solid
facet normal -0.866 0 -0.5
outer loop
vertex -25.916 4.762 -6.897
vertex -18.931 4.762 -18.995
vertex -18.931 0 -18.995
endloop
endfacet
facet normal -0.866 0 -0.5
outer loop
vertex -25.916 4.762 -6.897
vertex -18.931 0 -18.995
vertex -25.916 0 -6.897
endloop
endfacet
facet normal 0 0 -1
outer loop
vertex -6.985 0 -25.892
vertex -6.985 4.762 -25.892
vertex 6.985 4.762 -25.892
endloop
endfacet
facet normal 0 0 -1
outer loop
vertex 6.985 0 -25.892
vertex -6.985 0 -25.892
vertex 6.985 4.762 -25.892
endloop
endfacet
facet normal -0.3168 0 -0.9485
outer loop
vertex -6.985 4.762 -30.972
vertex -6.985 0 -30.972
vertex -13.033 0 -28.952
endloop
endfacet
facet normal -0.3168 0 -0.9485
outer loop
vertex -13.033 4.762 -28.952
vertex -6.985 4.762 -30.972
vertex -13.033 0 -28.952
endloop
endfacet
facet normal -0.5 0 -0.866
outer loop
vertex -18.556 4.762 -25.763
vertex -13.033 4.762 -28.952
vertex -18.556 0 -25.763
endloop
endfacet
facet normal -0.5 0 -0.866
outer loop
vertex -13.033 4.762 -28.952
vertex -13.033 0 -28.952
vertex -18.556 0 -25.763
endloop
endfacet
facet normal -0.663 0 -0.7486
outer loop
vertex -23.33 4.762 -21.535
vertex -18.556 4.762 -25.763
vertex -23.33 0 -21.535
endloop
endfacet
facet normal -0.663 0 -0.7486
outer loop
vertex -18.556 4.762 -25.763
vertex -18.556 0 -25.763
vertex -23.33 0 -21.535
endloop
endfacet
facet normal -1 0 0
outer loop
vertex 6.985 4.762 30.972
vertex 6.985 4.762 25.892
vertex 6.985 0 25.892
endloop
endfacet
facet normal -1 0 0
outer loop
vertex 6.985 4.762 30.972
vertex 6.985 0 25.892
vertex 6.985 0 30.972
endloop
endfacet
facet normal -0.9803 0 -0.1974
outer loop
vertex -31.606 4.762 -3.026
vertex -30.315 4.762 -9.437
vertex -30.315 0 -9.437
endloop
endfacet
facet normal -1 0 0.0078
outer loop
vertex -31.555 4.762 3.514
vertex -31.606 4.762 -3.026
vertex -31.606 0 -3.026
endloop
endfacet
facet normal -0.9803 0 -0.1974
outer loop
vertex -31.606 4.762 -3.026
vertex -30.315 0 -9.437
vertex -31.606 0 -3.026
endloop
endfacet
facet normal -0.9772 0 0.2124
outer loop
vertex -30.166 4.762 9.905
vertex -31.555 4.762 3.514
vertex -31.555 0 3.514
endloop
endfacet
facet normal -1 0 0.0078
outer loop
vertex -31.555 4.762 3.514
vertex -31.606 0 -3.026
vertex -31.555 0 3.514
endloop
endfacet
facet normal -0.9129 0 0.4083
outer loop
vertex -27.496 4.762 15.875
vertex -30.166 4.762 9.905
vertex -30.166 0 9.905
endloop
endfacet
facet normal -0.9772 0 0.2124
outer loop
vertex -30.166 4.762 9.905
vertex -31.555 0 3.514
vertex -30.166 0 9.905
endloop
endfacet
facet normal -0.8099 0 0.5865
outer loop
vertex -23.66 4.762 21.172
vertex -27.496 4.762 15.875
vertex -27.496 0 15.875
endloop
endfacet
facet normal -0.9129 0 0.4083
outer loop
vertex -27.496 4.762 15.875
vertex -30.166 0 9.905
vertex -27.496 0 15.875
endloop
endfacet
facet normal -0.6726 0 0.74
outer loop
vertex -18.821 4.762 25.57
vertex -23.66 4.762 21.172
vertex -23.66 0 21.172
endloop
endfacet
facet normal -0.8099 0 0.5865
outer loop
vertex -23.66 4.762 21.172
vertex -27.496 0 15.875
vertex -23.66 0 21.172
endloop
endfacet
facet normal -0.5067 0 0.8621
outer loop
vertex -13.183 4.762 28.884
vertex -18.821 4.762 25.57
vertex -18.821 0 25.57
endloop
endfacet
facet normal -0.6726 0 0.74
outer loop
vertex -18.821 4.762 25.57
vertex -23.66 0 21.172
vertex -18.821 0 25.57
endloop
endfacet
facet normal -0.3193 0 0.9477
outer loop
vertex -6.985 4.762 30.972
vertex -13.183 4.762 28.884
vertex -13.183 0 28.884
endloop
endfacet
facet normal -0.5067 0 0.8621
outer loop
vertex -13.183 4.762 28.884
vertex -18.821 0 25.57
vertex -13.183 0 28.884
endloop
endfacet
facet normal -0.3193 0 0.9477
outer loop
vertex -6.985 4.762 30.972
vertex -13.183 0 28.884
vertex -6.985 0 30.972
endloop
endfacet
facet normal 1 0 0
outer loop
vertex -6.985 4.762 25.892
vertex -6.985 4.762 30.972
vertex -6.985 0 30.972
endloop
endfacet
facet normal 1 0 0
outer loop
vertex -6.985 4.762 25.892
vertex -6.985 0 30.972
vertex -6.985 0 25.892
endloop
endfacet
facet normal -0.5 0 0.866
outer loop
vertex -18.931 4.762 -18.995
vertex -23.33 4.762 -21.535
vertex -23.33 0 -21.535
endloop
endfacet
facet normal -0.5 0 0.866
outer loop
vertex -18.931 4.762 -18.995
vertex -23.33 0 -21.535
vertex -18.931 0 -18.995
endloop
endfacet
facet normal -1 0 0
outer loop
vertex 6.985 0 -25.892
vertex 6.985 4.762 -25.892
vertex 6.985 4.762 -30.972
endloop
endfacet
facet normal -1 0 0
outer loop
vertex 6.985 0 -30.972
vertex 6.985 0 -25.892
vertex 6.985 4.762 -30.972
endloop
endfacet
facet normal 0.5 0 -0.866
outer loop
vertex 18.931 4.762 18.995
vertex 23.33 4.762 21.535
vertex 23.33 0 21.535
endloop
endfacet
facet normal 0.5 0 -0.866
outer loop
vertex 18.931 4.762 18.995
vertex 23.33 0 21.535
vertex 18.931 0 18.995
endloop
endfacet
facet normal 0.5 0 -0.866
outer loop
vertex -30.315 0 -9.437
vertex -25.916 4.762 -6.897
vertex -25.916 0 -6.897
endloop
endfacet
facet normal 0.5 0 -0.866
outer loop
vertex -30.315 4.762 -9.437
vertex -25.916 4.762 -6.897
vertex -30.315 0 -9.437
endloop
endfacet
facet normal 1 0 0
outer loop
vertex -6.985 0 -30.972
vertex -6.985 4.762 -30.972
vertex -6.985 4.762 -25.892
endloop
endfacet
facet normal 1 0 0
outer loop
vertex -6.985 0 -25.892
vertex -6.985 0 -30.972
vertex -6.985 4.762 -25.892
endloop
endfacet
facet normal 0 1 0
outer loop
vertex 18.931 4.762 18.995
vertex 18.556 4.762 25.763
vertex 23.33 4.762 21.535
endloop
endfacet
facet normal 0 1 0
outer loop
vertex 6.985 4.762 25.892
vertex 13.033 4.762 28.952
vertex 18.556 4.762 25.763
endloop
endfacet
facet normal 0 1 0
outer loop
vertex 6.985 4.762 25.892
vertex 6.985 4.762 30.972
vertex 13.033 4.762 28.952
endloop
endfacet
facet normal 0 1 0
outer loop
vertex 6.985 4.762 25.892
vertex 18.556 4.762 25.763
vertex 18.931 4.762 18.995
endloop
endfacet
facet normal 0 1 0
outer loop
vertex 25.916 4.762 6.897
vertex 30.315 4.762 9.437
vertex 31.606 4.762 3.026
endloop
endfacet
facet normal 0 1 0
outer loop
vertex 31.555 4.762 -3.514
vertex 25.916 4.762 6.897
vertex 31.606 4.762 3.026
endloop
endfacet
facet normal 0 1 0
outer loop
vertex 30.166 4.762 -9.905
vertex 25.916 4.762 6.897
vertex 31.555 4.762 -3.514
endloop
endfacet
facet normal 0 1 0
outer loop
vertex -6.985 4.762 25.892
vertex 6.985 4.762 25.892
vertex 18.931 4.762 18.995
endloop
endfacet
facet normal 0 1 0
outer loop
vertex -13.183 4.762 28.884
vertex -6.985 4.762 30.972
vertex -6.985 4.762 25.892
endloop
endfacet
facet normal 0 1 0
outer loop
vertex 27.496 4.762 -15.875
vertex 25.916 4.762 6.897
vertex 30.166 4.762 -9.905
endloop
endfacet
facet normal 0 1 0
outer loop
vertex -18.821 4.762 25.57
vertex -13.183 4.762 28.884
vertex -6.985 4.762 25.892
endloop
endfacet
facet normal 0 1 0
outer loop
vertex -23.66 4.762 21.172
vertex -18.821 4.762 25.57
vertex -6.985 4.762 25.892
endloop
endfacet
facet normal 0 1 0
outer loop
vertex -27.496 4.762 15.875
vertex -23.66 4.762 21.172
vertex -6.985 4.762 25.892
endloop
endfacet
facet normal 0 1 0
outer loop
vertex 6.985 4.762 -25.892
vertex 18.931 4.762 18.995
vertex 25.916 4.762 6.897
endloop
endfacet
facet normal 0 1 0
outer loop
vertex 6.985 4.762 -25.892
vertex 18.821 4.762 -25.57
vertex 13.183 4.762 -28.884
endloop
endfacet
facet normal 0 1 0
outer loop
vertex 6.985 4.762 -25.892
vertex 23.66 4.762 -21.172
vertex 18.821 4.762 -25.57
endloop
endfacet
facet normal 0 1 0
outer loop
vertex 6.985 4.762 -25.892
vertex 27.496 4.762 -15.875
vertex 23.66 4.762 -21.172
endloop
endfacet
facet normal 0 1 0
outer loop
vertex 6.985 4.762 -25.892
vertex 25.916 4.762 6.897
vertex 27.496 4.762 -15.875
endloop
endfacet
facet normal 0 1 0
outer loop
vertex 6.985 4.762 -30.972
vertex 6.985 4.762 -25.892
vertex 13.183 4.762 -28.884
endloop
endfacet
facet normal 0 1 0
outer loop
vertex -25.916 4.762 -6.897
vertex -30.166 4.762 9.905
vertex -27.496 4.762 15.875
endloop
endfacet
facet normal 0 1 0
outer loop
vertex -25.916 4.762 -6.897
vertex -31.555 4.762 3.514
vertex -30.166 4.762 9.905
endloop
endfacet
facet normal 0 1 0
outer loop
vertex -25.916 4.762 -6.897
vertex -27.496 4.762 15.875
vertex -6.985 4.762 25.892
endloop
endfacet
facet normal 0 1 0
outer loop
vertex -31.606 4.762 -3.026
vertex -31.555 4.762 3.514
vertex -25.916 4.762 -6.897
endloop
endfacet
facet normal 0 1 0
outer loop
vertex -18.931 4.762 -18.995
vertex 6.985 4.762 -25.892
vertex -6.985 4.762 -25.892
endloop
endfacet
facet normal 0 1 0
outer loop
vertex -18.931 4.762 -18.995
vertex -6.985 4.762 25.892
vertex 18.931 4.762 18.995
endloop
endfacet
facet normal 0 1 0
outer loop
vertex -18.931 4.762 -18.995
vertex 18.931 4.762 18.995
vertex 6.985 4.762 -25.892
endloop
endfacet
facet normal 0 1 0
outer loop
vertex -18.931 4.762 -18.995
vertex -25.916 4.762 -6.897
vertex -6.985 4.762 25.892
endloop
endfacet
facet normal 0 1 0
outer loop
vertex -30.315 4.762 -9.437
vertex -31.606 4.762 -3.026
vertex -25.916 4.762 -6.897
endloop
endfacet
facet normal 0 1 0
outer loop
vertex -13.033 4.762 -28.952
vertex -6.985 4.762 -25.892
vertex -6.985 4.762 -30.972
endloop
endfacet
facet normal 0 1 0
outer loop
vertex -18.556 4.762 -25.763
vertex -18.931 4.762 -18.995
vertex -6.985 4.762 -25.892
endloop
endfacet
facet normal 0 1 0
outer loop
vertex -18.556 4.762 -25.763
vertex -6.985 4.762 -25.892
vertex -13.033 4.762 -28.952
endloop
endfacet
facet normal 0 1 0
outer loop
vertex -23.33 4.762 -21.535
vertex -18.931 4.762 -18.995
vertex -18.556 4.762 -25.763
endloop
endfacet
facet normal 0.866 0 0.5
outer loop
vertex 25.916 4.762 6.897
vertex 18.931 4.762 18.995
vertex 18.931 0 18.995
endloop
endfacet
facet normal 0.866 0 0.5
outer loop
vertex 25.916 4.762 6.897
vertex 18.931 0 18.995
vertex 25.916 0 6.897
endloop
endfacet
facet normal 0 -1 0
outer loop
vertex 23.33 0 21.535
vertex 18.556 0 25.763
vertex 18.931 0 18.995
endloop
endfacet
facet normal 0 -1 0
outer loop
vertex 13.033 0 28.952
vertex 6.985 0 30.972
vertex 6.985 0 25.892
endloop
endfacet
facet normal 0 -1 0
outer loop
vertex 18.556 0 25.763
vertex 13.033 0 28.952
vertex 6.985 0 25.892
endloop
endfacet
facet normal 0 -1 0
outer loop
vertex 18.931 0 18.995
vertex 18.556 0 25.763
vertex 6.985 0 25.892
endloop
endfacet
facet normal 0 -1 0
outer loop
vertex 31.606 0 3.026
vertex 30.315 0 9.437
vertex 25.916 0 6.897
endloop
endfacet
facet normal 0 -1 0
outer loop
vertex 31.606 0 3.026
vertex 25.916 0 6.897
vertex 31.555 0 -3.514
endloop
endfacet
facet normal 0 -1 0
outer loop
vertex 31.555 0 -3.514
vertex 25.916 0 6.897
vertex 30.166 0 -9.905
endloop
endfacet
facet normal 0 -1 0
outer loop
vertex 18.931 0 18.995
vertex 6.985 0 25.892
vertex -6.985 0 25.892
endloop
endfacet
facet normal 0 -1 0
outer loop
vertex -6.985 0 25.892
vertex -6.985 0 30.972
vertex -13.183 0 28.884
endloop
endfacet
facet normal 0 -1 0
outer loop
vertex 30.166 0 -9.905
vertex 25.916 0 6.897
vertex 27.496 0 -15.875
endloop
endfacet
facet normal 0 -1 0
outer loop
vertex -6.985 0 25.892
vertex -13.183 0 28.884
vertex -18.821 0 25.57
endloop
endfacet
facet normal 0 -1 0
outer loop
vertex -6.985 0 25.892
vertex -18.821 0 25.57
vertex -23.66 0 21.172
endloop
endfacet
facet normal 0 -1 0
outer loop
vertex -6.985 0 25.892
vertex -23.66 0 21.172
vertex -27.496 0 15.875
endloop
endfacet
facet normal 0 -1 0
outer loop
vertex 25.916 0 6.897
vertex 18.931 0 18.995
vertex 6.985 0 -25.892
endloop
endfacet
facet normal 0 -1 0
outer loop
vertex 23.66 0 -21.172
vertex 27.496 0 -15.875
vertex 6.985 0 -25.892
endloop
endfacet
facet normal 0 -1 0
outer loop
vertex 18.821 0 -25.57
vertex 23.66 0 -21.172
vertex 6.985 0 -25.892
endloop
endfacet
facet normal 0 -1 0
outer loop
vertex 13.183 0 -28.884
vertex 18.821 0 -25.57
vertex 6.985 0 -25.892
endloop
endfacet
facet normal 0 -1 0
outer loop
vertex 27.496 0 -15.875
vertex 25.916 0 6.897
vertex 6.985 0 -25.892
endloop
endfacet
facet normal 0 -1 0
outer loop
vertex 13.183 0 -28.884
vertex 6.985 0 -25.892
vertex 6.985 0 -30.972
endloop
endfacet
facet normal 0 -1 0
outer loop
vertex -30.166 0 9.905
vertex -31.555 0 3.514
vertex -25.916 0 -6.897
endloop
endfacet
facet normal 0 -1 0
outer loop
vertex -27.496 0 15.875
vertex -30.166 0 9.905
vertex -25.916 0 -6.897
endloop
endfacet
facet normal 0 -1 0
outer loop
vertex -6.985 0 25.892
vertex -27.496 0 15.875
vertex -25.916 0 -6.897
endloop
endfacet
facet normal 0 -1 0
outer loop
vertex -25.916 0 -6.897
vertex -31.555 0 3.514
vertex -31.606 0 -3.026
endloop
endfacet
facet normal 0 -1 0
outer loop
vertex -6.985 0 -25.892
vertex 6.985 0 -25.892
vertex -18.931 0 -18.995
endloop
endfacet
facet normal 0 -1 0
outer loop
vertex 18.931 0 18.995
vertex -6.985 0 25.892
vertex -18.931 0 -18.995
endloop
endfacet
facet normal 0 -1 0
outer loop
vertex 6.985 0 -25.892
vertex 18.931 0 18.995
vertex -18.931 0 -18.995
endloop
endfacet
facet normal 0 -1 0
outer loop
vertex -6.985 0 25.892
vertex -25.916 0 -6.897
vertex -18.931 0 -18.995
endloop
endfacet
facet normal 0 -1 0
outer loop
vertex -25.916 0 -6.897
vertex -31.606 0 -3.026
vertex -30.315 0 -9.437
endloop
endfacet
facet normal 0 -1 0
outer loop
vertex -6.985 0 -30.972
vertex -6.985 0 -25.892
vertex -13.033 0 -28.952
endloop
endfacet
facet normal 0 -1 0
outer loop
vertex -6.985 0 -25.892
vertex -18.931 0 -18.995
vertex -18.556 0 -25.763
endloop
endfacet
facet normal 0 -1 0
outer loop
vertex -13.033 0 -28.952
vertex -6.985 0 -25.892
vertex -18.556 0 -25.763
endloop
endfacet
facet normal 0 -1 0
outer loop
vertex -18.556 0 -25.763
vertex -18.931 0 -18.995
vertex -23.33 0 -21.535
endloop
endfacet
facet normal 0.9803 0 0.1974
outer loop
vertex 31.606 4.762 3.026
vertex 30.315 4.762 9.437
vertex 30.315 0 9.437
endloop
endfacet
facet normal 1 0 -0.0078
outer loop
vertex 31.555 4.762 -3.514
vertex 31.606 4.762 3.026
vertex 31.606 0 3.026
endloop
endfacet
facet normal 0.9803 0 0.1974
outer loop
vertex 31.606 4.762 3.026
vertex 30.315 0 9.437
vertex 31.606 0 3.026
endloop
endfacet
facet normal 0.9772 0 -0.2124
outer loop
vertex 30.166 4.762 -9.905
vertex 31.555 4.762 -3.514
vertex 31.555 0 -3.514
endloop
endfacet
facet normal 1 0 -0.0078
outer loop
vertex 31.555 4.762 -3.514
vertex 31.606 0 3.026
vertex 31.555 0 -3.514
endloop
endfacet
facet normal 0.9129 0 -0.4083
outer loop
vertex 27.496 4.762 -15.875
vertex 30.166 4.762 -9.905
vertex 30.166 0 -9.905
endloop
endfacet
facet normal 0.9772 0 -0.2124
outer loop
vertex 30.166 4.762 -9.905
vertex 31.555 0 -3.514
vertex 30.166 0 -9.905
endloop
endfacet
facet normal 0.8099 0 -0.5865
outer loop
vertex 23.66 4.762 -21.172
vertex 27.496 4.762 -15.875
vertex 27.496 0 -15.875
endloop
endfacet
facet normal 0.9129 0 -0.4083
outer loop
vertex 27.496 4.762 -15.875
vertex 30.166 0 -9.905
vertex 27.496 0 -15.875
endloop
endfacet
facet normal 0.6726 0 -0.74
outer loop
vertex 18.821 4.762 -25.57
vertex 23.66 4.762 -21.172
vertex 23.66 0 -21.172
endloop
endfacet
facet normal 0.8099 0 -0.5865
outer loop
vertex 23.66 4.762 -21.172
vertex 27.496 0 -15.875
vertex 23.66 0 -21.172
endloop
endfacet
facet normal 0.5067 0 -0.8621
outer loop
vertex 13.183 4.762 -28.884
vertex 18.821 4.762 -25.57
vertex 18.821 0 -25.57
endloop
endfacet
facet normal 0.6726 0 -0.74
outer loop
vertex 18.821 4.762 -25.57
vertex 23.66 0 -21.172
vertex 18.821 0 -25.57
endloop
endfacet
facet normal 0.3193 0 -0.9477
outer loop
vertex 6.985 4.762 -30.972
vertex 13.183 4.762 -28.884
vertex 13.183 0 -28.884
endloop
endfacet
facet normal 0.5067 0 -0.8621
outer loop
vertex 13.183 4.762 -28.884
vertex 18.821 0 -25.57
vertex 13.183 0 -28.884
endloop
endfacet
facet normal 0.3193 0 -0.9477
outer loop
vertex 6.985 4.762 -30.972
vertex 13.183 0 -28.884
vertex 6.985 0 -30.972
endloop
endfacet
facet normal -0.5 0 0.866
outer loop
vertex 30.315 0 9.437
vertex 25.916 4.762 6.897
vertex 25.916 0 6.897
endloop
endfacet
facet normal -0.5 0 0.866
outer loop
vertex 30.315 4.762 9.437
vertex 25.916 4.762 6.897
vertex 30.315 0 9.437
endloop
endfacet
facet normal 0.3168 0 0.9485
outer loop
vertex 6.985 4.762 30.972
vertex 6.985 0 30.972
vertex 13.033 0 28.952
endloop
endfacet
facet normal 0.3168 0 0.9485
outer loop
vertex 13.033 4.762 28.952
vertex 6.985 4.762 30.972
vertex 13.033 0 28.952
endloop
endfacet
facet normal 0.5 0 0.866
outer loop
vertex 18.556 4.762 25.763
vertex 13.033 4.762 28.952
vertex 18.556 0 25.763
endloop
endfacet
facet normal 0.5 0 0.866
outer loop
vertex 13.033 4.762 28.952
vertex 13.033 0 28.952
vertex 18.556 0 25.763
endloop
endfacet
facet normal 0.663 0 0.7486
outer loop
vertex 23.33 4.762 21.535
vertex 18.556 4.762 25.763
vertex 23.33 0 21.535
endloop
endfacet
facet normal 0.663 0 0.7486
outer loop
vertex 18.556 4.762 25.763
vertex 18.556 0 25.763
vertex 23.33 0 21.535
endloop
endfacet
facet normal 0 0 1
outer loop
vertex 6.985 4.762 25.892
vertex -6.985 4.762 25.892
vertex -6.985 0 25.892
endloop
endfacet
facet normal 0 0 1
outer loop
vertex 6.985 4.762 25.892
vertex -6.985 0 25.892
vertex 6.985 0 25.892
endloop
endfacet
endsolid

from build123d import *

# Parameters (mm, degrees)
SKETCH1_R           = 31.75
BOSS_EXTRUDE1_DEPTH = 4.7625
CUT_EXTRUDE1_REACH  = 47.153
CUT_EXTRUDE2_REACH  = 46.61


with BuildPart() as part:
    # Sketch1 → Boss-Extrude1 (new body)
    with BuildSketch(Plane(origin=(0, 0, 0), x_dir=(1, 0, 0), z_dir=(0, 1, 0))):
        with Locations(Location((0, 0, 0), (0, 0, 90))):
            Circle(SKETCH1_R)
    extrude(amount=BOSS_EXTRUDE1_DEPTH)

    # Sketch2 → Cut-Extrude1 (cut, up to next)
    with BuildSketch(Plane(origin=(0, 4.7625, 0), x_dir=(1, 0, 0), z_dir=(0, 1, 0)), mode=Mode.PRIVATE) as cut_extrude1_sk1:
        with BuildLine():
            Line((-6.985, -30.972120932), (-6.985, -25.892120932))
            Line((-6.985, -25.892120932), (6.985, -25.892120932))
            Line((6.985, -25.892120932), (6.985, -30.972120932))
            ThreePointArc((6.985, -30.972120932), (0, -31.75), (-6.985, -30.972120932))
        make_face()
    cut_extrude1_tool1 = extrude(cut_extrude1_sk1.sketch, amount=-CUT_EXTRUDE1_REACH, mode=Mode.PRIVATE) & part.part
    # Sketch2 → Cut-Extrude1 (cut, up to next)
    with BuildSketch(Plane(origin=(0, 4.7625, 0), x_dir=(1, 0, 0), z_dir=(0, 1, 0)), mode=Mode.PRIVATE) as cut_extrude1_sk2:
        with BuildLine():
            Line((-6.985, 30.972120932), (-6.985, 25.892120932))
            Line((-6.985, 25.892120932), (6.985, 25.892120932))
            Line((6.985, 25.892120932), (6.985, 30.972120932))
            ThreePointArc((6.985, 30.972120932), (0, 31.75), (-6.985, 30.972120932))
        make_face()
    cut_extrude1_tool2 = extrude(cut_extrude1_sk2.sketch, amount=-CUT_EXTRUDE1_REACH, mode=Mode.PRIVATE) & part.part
    add(cut_extrude1_tool1.solids().sort_by_distance((0, 4.7625, 28.696841))[0], mode=Mode.SUBTRACT)
    add(cut_extrude1_tool2.solids().sort_by_distance((0, 4.7625, -28.696841))[0], mode=Mode.SUBTRACT)

    # Sketch3 → Cut-Extrude2 (cut, up to next)
    with BuildSketch(Plane(origin=(0, 4.7625, 0), x_dir=(1, 0, 0), z_dir=(0, 1, 0)), mode=Mode.PRIVATE) as cut_extrude2_sk1:
        with BuildLine():
            Line((18.930734485, -18.995247911), (25.915734485, -6.89687302))
            Line((25.915734485, -6.89687302), (30.315143536, -9.43687302))
            ThreePointArc((30.315143536, -9.43687302), (27.49630657, -15.875), (23.330143536, -21.535247911))
            Line((23.330143536, -21.535247911), (18.930734485, -18.995247911))
        make_face()
    cut_extrude2_tool1 = extrude(cut_extrude2_sk1.sketch, amount=-CUT_EXTRUDE2_REACH, mode=Mode.PRIVATE) & part.part
    # Sketch3 → Cut-Extrude2 (cut, up to next)
    with BuildSketch(Plane(origin=(0, 4.7625, 0), x_dir=(1, 0, 0), z_dir=(0, 1, 0)), mode=Mode.PRIVATE) as cut_extrude2_sk2:
        with BuildLine():
            Line((-25.915734485, 6.89687302), (-30.315143536, 9.43687302))
            ThreePointArc((-30.315143536, 9.43687302), (-27.49630657, 15.875), (-23.330143536, 21.535247911))
            Line((-23.330143536, 21.535247911), (-18.930734485, 18.995247911))
            Line((-18.930734485, 18.995247911), (-25.915734485, 6.89687302))
        make_face()
    cut_extrude2_tool2 = extrude(cut_extrude2_sk2.sketch, amount=-CUT_EXTRUDE2_REACH, mode=Mode.PRIVATE) & part.part
    add(cut_extrude2_tool1.solids().sort_by_distance((24.852194, 4.7625, 14.348421))[0], mode=Mode.SUBTRACT)
    add(cut_extrude2_tool2.solids().sort_by_distance((-24.852194, 4.7625, -14.348421))[0], mode=Mode.SUBTRACT)


solid = part.part
